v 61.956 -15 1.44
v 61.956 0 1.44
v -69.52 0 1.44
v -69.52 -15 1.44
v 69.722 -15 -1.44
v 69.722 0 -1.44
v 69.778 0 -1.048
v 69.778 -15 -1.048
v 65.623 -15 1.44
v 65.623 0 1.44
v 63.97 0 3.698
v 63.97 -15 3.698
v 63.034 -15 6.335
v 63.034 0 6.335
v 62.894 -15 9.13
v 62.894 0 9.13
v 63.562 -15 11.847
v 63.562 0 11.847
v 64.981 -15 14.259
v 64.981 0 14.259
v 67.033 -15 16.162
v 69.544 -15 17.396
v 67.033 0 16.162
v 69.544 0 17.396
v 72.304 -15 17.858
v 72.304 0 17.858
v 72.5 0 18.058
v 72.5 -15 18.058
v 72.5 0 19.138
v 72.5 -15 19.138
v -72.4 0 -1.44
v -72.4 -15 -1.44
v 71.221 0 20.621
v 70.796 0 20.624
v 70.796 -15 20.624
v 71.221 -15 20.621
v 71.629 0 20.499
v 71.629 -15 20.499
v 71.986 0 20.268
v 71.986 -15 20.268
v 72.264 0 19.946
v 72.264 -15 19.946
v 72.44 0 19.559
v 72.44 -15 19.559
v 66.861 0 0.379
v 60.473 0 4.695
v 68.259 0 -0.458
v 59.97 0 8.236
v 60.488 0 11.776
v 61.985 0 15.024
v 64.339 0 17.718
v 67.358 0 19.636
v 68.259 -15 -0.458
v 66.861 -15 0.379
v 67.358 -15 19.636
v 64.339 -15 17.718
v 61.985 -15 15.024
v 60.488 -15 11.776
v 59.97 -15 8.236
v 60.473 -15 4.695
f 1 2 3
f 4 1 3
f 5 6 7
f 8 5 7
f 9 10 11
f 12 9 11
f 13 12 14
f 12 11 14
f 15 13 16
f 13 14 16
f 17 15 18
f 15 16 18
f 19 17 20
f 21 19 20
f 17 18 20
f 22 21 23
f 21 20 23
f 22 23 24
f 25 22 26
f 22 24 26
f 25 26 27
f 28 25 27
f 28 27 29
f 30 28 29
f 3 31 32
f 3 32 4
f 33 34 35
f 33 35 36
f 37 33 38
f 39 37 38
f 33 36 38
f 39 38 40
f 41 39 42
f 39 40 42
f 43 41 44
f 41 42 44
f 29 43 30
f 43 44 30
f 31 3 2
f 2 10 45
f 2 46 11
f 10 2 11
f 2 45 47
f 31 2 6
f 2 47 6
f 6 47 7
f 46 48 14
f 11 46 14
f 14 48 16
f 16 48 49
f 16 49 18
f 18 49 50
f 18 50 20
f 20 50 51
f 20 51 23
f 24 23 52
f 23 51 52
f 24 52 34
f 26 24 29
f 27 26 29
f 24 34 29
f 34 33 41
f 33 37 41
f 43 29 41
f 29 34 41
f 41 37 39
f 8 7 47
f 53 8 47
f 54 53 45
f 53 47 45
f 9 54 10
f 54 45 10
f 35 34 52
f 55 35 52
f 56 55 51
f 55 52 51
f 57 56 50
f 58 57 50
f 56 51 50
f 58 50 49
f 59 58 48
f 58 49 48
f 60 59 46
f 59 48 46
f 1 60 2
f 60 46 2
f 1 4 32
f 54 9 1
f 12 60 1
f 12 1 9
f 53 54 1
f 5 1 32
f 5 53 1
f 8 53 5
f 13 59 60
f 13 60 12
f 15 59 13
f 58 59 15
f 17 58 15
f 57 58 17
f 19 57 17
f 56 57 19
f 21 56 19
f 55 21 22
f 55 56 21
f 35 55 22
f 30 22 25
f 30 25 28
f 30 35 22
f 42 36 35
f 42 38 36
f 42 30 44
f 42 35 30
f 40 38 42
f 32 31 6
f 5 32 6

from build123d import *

# Parameters (mm, degrees)
F1_DEPTH    = 15
F2_T1_DEPTH = 28.8982001462
F2_T3_DEPTH = 16.0188013663
F3_T1_DEPTH = 30.3272306083
F4_R        = 1.5


# Not quite as in the source:
# - a fillet or chamfer that OpenCascade refuses, or shapes differently, is made with other operations: its cross-section is extruded or revolved along the edge and cut away or added
# - a feature names something its author has since deleted; it is built from what else it names


with BuildPart() as f1:
    # F0 (on Front) → F1 (new body)
    with BuildSketch(Plane.XZ):
        with BuildLine():
            ThreePointArc((64.5076036134, -1.44), (63.120788421, -0.0985070956), (61.9563763345, 1.44))
            Line((61.9563763345, 1.44), (-72.5, 1.44))
            Line((-72.5, 1.44), (-72.5, -1.44))
            Line((-72.5, -1.44), (64.5076036134, -1.44))
        make_face()
        with BuildLine():
            Line((61.9563763345, 1.44), (65.6232565847, 1.44))
            ThreePointArc((65.6232565847, 1.44), (63.599073082, 11.9377338961), (72.5, 17.86))
            Line((72.5, 17.86), (72.5, 20.74))
            ThreePointArc((72.5, 20.74), (61.5038870504, 14.2171956852), (61.9563763345, 1.44))
        make_face()
        with BuildLine():
            ThreePointArc((72.5, -1.44), (68.7722661039, -0.690926918), (65.6232565847, 1.44))
            Line((65.6232565847, 1.44), (61.9563763345, 1.44))
            ThreePointArc((61.9563763345, 1.44), (63.120788421, -0.0985070956), (64.5076036134, -1.44))
            Line((64.5076036134, -1.44), (72.5, -1.44))
        make_face()
    extrude(amount=F1_DEPTH)

    # F2: chamfer of 0.2 on 2 edges, made by hand

    # F2_s2 → F2_t1 (cut)
    with BuildSketch(Plane.XZ.offset(-6.9491000731)):
        with BuildLine():
            Line((69.7215112021, -1.44), (69.7779272183, -1.0481218274))
            ThreePointArc((69.7779272183, -1.0481218274), (71.1249319352, -1.3415280357), (72.5, -1.44))
            Line((72.5, -1.44), (69.7215112021, -1.44))
        make_face()
    extrude(amount=F2_T1_DEPTH, mode=Mode.SUBTRACT)

    # F2_s4 → F2_t3 (cut)
    with BuildSketch(Plane.XZ.offset(-0.5094006831)):
        with BuildLine():
            Line((72.3040609137, 17.8580105656), (72.5, 18.0579693338))
            Line((72.5, 18.0579693338), (72.5, 17.86))
            ThreePointArc((72.5, 17.86), (72.399196155, 17.8594734874), (72.3040609137, 17.8580105656))
        make_face()
    extrude(amount=F2_T3_DEPTH, mode=Mode.SUBTRACT)

    # F3: chamfer of 2.98 on 1 edges, made by hand

    # F3_s2 → F3_t1 (cut)
    with BuildSketch(Plane.XZ.offset(-7.6636153041)):
        Polygon((-72.5, -1.54), (-69.52, 1.44), (-72.5, 1.44), align=None)
    extrude(amount=F3_T1_DEPTH, mode=Mode.SUBTRACT)

    # F4
    f4_edges = [f1.edges().sort_by_distance(p)[0] for p in [
        (72.5, -7.5, 20.74),
    ]]
    fillet(f4_edges, radius=F4_R)


solid = f1.part
